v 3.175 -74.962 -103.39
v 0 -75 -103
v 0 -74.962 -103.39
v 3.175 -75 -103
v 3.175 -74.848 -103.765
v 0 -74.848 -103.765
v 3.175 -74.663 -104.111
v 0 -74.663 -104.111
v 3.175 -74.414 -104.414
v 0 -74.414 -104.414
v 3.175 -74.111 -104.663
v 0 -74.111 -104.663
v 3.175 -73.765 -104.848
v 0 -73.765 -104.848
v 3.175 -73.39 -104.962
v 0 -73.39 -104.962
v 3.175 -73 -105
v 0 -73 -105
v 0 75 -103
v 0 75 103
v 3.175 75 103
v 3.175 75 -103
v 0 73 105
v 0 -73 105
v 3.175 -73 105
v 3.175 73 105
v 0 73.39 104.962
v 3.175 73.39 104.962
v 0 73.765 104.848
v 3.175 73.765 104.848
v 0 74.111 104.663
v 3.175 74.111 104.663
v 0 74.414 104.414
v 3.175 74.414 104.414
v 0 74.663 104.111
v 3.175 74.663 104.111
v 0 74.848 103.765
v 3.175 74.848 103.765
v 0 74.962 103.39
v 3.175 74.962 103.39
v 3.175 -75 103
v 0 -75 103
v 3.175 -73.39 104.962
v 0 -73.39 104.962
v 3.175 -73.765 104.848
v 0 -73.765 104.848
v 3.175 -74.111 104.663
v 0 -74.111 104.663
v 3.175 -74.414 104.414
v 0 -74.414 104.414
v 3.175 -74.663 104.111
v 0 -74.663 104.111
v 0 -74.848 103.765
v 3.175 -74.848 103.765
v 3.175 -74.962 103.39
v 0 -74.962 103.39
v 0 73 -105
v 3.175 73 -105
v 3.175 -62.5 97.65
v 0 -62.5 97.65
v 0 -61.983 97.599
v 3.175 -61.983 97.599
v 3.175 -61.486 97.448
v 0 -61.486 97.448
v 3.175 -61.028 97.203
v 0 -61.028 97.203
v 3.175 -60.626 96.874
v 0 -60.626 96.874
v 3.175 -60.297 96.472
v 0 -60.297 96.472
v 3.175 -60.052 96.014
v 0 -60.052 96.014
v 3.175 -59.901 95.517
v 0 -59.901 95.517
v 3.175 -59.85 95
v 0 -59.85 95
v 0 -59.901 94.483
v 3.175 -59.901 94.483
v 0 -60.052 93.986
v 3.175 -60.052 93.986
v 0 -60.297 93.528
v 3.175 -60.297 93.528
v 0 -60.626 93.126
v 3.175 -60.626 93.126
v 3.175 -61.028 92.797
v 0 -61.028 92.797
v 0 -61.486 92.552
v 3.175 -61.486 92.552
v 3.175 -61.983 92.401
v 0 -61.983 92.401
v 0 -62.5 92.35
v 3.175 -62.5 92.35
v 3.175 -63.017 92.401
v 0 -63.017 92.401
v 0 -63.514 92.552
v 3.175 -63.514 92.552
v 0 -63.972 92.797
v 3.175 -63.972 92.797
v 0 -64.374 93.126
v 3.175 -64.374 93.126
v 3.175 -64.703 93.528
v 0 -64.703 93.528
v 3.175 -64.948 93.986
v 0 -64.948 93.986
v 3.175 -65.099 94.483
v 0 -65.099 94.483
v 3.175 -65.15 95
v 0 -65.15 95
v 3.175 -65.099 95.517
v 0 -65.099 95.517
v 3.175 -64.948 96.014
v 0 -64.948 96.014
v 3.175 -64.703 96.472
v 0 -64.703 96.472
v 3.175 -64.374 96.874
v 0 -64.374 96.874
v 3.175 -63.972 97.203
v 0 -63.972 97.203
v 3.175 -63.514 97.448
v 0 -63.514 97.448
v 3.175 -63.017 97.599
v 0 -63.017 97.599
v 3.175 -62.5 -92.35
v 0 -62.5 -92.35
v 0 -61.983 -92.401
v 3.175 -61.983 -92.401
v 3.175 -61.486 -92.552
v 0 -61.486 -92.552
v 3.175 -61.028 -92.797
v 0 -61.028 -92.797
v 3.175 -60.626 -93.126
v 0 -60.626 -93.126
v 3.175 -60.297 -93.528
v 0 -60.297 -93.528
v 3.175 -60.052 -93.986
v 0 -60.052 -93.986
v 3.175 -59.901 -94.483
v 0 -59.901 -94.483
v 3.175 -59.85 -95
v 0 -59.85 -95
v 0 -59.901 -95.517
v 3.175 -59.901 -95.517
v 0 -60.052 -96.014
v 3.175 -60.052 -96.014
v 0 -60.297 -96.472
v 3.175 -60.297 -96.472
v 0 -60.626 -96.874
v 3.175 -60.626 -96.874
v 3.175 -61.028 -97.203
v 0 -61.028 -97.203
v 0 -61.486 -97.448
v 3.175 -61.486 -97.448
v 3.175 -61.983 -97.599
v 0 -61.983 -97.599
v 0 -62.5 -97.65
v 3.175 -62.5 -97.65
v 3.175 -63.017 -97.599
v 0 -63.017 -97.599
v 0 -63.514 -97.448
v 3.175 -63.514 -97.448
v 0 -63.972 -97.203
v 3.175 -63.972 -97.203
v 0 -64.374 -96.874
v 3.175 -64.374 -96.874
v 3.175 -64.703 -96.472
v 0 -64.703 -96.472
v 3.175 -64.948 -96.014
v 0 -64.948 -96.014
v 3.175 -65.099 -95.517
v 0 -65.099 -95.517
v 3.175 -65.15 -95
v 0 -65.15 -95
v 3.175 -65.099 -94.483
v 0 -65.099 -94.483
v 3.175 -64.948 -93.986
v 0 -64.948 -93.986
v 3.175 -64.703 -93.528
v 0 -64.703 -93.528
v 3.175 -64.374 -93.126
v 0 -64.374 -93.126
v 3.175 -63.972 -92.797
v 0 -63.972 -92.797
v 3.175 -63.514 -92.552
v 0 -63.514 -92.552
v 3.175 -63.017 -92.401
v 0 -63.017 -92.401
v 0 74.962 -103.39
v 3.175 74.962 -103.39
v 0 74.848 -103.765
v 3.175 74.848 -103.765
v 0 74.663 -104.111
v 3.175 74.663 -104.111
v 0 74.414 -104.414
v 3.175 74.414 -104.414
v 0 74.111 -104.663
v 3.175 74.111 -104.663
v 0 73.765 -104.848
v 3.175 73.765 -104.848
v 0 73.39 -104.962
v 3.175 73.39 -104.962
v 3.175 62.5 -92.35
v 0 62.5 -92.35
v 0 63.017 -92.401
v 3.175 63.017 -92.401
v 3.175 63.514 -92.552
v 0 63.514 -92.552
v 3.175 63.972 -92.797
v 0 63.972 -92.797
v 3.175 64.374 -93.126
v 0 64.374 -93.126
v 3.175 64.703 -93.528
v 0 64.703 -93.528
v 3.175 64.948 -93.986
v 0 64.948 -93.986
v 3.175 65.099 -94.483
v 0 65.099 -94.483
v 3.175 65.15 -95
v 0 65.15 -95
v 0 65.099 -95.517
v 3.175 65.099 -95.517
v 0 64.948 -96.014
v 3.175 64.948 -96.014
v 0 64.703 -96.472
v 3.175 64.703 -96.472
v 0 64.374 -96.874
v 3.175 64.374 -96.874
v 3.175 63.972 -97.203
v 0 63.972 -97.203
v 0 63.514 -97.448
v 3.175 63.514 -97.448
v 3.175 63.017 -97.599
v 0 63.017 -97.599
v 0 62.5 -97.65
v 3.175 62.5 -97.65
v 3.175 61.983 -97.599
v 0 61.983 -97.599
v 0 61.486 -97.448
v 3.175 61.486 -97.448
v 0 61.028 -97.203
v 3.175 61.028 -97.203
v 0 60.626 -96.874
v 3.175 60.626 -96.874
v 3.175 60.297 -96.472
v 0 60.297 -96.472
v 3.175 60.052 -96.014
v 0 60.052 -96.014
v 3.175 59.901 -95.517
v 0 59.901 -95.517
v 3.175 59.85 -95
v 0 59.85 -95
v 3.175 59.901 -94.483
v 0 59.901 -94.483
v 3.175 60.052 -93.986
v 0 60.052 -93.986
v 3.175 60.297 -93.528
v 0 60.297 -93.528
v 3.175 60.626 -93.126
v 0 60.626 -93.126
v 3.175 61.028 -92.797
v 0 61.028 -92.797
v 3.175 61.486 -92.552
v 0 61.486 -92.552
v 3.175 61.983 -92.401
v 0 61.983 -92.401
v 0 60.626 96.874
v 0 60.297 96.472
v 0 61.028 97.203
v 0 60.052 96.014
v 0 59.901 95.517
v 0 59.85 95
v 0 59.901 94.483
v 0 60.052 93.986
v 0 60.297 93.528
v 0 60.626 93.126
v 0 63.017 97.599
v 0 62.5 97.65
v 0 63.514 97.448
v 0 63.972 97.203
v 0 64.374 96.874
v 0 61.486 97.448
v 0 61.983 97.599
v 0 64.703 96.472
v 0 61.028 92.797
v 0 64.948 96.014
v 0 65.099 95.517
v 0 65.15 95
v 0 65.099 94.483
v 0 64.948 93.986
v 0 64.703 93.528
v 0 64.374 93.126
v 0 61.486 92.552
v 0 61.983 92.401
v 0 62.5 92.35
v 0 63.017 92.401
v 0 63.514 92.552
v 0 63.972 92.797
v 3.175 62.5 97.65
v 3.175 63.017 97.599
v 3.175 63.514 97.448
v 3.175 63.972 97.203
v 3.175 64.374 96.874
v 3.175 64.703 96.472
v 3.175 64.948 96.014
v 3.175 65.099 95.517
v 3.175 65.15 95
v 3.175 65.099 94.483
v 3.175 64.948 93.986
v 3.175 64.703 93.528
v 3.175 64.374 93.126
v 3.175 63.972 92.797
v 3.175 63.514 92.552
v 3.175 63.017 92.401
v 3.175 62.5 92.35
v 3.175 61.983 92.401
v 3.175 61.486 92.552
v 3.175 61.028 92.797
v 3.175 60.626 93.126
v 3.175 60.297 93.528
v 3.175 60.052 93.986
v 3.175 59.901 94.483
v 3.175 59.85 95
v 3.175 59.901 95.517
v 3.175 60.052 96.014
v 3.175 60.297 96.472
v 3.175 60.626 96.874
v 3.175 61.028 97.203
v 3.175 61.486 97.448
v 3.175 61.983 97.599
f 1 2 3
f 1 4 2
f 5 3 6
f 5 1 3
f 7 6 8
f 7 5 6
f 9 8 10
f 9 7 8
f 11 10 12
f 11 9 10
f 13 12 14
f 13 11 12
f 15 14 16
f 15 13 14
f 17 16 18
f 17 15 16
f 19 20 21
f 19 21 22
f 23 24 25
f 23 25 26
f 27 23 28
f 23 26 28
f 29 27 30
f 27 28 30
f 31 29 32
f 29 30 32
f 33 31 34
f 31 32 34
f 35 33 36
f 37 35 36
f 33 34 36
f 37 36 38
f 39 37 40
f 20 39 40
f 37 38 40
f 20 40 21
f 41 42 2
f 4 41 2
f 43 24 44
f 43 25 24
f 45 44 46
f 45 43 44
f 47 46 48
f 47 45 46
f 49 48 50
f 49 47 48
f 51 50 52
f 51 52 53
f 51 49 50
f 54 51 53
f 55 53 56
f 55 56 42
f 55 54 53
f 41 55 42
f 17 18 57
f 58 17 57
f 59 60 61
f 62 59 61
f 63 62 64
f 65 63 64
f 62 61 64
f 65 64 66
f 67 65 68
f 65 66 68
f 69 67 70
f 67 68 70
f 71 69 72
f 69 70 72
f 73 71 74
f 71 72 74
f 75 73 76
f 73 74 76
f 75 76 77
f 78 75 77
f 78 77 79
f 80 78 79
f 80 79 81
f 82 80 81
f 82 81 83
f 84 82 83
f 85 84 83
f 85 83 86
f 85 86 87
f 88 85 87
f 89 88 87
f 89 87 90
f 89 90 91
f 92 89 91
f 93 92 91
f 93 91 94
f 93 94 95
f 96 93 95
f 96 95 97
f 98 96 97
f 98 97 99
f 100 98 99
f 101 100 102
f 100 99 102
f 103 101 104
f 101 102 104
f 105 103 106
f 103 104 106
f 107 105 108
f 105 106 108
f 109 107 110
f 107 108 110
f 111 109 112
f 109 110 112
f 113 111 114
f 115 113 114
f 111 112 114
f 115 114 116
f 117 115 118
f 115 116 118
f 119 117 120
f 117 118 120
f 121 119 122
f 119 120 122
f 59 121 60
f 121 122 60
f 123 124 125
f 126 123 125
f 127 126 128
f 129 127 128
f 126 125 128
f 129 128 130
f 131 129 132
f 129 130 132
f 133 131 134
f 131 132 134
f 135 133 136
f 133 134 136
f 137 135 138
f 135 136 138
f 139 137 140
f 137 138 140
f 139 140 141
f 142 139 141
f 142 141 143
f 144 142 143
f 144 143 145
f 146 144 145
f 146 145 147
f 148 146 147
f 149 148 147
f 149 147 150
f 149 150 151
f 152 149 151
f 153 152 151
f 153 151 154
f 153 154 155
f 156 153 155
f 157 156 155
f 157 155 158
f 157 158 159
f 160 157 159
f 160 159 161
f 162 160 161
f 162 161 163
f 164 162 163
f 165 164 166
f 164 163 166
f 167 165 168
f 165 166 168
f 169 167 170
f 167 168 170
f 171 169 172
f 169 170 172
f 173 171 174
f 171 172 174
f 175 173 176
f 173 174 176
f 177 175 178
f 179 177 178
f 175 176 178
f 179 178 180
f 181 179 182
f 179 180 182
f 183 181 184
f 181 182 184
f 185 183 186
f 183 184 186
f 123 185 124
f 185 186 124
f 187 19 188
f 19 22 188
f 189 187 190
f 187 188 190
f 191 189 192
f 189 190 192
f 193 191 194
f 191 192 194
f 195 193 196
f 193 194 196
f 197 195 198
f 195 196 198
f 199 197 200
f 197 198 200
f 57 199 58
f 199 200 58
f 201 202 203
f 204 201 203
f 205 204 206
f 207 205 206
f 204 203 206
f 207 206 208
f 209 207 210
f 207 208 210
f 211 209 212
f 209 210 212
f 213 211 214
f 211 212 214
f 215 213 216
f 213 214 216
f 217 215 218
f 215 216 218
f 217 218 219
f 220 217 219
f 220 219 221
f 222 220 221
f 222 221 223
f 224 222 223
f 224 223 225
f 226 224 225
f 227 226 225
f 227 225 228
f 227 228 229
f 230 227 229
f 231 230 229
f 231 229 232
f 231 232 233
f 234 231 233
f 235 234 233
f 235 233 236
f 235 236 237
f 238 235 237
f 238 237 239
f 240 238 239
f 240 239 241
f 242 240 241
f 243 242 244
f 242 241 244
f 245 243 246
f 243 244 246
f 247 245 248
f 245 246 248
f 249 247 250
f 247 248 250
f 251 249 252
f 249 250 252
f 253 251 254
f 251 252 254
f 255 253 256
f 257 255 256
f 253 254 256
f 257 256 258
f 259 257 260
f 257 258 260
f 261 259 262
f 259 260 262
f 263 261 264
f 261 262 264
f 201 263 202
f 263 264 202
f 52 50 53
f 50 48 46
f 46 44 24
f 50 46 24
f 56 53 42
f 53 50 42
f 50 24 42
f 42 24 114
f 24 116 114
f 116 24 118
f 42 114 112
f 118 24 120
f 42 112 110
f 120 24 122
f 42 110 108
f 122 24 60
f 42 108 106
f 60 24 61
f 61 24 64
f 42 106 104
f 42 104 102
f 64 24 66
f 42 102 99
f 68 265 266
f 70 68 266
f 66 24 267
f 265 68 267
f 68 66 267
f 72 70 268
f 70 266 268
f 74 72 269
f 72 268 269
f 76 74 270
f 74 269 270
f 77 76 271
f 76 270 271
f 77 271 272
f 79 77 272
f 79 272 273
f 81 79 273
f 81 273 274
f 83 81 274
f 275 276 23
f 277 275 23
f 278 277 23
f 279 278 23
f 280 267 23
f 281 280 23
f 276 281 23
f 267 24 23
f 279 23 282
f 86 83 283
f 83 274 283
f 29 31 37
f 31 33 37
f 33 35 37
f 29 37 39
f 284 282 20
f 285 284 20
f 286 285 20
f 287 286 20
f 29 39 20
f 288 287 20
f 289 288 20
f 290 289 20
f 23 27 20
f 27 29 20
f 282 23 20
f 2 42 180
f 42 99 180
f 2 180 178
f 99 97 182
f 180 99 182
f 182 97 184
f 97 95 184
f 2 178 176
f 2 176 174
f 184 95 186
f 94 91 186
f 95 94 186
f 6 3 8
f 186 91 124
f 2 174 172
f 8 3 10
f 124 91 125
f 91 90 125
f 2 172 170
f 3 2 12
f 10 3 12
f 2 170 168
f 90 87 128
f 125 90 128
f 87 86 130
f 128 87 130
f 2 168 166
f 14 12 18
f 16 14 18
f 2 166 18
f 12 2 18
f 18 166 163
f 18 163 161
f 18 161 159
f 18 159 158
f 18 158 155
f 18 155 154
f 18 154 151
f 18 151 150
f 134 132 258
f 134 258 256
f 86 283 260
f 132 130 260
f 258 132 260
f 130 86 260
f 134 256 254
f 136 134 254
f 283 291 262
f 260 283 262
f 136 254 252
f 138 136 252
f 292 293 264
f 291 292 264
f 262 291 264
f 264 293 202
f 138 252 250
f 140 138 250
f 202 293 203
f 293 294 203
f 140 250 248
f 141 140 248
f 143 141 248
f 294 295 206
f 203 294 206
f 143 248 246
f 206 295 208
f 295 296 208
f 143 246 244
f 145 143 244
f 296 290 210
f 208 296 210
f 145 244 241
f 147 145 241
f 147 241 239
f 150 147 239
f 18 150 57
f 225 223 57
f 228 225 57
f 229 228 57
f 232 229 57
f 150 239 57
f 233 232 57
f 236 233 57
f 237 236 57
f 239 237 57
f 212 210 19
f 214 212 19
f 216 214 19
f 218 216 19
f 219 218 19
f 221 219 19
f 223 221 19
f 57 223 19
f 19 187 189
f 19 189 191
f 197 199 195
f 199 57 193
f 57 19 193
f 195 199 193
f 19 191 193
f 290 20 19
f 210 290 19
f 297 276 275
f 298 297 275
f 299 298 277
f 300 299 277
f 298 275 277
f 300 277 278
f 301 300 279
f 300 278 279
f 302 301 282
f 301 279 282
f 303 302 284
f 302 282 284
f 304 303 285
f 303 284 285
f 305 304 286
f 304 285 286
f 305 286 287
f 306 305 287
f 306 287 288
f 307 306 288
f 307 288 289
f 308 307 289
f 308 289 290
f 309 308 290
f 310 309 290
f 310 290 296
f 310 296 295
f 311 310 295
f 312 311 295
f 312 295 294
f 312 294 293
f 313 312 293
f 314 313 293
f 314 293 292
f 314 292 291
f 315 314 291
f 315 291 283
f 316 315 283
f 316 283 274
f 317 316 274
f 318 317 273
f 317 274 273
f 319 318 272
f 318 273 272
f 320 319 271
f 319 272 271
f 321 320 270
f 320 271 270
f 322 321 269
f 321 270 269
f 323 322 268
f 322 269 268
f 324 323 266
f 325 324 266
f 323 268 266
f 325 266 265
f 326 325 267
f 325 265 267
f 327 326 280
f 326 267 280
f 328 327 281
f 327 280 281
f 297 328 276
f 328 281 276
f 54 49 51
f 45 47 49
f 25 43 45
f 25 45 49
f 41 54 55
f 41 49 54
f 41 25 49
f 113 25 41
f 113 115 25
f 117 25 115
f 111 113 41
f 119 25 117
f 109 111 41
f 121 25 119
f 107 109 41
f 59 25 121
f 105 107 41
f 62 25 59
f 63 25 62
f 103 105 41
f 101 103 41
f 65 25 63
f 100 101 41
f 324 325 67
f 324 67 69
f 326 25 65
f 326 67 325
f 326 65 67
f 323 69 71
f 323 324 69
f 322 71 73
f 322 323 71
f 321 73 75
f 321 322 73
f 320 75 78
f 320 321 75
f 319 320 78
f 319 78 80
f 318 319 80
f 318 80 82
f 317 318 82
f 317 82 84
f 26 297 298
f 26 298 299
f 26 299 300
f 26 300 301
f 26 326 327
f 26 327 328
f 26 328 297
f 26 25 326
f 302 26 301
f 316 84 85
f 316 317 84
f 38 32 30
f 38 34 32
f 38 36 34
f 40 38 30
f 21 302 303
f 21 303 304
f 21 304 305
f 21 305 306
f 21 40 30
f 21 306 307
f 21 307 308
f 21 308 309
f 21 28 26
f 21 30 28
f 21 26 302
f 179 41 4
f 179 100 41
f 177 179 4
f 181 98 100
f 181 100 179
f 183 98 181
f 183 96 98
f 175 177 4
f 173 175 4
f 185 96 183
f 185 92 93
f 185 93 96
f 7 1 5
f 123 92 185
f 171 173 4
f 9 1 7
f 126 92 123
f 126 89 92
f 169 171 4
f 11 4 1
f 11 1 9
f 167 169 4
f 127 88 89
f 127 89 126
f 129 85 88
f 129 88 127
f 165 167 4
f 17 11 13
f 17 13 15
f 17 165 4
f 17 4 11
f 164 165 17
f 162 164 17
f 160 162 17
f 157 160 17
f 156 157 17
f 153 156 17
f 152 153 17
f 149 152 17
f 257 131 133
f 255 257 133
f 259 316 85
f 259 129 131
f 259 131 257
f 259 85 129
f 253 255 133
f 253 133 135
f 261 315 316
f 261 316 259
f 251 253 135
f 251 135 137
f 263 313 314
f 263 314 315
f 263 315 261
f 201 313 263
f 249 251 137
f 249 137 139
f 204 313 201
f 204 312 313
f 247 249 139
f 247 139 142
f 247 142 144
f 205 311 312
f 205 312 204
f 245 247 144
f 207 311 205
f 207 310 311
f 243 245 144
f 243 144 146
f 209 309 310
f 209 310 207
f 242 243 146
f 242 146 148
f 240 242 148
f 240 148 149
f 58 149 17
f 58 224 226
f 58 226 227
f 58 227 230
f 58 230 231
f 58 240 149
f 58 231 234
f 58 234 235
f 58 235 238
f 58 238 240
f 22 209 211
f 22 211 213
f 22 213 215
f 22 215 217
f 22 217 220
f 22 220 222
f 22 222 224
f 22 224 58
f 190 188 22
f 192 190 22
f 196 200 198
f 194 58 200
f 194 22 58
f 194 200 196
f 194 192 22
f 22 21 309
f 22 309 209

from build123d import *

# Parameters (mm, degrees)
SKETCH2_W            = 210
SKETCH2_H            = 150
BOSS_EXTRUDE1_DEPTH  = 3.175
M5_CLEARANCE_HOLE2_D = 5.3
FILLET2_R            = 2


with BuildPart() as part:
    # Sketch2 → Boss-Extrude1 (new body)
    with BuildSketch(Plane(origin=(0, 0, 0), x_dir=(0, 0, -1), z_dir=(1, 0, 0))):
        Rectangle(SKETCH2_W, SKETCH2_H)
    extrude(amount=BOSS_EXTRUDE1_DEPTH)

    # M5 Clearance Hole2 (through all)
    with Locations(Plane(origin=(3.175, 0, 0), x_dir=(0, 0, -1), z_dir=(1, 0, 0))):
        with Locations((-95, 62.5), (95, 62.5), (-95, -62.5), (95, -62.5)):
            Hole(M5_CLEARANCE_HOLE2_D / 2)

    # Fillet2
    fillet2_edges = [part.edges().sort_by_distance(p)[0] for p in [
        (1.5875, -75, -105),
        (1.5875, -75, 105),
        (1.5875, 75, 105),
        (1.5875, 75, -105),
    ]]
    fillet(fillet2_edges, radius=FILLET2_R)


solid = part.part
